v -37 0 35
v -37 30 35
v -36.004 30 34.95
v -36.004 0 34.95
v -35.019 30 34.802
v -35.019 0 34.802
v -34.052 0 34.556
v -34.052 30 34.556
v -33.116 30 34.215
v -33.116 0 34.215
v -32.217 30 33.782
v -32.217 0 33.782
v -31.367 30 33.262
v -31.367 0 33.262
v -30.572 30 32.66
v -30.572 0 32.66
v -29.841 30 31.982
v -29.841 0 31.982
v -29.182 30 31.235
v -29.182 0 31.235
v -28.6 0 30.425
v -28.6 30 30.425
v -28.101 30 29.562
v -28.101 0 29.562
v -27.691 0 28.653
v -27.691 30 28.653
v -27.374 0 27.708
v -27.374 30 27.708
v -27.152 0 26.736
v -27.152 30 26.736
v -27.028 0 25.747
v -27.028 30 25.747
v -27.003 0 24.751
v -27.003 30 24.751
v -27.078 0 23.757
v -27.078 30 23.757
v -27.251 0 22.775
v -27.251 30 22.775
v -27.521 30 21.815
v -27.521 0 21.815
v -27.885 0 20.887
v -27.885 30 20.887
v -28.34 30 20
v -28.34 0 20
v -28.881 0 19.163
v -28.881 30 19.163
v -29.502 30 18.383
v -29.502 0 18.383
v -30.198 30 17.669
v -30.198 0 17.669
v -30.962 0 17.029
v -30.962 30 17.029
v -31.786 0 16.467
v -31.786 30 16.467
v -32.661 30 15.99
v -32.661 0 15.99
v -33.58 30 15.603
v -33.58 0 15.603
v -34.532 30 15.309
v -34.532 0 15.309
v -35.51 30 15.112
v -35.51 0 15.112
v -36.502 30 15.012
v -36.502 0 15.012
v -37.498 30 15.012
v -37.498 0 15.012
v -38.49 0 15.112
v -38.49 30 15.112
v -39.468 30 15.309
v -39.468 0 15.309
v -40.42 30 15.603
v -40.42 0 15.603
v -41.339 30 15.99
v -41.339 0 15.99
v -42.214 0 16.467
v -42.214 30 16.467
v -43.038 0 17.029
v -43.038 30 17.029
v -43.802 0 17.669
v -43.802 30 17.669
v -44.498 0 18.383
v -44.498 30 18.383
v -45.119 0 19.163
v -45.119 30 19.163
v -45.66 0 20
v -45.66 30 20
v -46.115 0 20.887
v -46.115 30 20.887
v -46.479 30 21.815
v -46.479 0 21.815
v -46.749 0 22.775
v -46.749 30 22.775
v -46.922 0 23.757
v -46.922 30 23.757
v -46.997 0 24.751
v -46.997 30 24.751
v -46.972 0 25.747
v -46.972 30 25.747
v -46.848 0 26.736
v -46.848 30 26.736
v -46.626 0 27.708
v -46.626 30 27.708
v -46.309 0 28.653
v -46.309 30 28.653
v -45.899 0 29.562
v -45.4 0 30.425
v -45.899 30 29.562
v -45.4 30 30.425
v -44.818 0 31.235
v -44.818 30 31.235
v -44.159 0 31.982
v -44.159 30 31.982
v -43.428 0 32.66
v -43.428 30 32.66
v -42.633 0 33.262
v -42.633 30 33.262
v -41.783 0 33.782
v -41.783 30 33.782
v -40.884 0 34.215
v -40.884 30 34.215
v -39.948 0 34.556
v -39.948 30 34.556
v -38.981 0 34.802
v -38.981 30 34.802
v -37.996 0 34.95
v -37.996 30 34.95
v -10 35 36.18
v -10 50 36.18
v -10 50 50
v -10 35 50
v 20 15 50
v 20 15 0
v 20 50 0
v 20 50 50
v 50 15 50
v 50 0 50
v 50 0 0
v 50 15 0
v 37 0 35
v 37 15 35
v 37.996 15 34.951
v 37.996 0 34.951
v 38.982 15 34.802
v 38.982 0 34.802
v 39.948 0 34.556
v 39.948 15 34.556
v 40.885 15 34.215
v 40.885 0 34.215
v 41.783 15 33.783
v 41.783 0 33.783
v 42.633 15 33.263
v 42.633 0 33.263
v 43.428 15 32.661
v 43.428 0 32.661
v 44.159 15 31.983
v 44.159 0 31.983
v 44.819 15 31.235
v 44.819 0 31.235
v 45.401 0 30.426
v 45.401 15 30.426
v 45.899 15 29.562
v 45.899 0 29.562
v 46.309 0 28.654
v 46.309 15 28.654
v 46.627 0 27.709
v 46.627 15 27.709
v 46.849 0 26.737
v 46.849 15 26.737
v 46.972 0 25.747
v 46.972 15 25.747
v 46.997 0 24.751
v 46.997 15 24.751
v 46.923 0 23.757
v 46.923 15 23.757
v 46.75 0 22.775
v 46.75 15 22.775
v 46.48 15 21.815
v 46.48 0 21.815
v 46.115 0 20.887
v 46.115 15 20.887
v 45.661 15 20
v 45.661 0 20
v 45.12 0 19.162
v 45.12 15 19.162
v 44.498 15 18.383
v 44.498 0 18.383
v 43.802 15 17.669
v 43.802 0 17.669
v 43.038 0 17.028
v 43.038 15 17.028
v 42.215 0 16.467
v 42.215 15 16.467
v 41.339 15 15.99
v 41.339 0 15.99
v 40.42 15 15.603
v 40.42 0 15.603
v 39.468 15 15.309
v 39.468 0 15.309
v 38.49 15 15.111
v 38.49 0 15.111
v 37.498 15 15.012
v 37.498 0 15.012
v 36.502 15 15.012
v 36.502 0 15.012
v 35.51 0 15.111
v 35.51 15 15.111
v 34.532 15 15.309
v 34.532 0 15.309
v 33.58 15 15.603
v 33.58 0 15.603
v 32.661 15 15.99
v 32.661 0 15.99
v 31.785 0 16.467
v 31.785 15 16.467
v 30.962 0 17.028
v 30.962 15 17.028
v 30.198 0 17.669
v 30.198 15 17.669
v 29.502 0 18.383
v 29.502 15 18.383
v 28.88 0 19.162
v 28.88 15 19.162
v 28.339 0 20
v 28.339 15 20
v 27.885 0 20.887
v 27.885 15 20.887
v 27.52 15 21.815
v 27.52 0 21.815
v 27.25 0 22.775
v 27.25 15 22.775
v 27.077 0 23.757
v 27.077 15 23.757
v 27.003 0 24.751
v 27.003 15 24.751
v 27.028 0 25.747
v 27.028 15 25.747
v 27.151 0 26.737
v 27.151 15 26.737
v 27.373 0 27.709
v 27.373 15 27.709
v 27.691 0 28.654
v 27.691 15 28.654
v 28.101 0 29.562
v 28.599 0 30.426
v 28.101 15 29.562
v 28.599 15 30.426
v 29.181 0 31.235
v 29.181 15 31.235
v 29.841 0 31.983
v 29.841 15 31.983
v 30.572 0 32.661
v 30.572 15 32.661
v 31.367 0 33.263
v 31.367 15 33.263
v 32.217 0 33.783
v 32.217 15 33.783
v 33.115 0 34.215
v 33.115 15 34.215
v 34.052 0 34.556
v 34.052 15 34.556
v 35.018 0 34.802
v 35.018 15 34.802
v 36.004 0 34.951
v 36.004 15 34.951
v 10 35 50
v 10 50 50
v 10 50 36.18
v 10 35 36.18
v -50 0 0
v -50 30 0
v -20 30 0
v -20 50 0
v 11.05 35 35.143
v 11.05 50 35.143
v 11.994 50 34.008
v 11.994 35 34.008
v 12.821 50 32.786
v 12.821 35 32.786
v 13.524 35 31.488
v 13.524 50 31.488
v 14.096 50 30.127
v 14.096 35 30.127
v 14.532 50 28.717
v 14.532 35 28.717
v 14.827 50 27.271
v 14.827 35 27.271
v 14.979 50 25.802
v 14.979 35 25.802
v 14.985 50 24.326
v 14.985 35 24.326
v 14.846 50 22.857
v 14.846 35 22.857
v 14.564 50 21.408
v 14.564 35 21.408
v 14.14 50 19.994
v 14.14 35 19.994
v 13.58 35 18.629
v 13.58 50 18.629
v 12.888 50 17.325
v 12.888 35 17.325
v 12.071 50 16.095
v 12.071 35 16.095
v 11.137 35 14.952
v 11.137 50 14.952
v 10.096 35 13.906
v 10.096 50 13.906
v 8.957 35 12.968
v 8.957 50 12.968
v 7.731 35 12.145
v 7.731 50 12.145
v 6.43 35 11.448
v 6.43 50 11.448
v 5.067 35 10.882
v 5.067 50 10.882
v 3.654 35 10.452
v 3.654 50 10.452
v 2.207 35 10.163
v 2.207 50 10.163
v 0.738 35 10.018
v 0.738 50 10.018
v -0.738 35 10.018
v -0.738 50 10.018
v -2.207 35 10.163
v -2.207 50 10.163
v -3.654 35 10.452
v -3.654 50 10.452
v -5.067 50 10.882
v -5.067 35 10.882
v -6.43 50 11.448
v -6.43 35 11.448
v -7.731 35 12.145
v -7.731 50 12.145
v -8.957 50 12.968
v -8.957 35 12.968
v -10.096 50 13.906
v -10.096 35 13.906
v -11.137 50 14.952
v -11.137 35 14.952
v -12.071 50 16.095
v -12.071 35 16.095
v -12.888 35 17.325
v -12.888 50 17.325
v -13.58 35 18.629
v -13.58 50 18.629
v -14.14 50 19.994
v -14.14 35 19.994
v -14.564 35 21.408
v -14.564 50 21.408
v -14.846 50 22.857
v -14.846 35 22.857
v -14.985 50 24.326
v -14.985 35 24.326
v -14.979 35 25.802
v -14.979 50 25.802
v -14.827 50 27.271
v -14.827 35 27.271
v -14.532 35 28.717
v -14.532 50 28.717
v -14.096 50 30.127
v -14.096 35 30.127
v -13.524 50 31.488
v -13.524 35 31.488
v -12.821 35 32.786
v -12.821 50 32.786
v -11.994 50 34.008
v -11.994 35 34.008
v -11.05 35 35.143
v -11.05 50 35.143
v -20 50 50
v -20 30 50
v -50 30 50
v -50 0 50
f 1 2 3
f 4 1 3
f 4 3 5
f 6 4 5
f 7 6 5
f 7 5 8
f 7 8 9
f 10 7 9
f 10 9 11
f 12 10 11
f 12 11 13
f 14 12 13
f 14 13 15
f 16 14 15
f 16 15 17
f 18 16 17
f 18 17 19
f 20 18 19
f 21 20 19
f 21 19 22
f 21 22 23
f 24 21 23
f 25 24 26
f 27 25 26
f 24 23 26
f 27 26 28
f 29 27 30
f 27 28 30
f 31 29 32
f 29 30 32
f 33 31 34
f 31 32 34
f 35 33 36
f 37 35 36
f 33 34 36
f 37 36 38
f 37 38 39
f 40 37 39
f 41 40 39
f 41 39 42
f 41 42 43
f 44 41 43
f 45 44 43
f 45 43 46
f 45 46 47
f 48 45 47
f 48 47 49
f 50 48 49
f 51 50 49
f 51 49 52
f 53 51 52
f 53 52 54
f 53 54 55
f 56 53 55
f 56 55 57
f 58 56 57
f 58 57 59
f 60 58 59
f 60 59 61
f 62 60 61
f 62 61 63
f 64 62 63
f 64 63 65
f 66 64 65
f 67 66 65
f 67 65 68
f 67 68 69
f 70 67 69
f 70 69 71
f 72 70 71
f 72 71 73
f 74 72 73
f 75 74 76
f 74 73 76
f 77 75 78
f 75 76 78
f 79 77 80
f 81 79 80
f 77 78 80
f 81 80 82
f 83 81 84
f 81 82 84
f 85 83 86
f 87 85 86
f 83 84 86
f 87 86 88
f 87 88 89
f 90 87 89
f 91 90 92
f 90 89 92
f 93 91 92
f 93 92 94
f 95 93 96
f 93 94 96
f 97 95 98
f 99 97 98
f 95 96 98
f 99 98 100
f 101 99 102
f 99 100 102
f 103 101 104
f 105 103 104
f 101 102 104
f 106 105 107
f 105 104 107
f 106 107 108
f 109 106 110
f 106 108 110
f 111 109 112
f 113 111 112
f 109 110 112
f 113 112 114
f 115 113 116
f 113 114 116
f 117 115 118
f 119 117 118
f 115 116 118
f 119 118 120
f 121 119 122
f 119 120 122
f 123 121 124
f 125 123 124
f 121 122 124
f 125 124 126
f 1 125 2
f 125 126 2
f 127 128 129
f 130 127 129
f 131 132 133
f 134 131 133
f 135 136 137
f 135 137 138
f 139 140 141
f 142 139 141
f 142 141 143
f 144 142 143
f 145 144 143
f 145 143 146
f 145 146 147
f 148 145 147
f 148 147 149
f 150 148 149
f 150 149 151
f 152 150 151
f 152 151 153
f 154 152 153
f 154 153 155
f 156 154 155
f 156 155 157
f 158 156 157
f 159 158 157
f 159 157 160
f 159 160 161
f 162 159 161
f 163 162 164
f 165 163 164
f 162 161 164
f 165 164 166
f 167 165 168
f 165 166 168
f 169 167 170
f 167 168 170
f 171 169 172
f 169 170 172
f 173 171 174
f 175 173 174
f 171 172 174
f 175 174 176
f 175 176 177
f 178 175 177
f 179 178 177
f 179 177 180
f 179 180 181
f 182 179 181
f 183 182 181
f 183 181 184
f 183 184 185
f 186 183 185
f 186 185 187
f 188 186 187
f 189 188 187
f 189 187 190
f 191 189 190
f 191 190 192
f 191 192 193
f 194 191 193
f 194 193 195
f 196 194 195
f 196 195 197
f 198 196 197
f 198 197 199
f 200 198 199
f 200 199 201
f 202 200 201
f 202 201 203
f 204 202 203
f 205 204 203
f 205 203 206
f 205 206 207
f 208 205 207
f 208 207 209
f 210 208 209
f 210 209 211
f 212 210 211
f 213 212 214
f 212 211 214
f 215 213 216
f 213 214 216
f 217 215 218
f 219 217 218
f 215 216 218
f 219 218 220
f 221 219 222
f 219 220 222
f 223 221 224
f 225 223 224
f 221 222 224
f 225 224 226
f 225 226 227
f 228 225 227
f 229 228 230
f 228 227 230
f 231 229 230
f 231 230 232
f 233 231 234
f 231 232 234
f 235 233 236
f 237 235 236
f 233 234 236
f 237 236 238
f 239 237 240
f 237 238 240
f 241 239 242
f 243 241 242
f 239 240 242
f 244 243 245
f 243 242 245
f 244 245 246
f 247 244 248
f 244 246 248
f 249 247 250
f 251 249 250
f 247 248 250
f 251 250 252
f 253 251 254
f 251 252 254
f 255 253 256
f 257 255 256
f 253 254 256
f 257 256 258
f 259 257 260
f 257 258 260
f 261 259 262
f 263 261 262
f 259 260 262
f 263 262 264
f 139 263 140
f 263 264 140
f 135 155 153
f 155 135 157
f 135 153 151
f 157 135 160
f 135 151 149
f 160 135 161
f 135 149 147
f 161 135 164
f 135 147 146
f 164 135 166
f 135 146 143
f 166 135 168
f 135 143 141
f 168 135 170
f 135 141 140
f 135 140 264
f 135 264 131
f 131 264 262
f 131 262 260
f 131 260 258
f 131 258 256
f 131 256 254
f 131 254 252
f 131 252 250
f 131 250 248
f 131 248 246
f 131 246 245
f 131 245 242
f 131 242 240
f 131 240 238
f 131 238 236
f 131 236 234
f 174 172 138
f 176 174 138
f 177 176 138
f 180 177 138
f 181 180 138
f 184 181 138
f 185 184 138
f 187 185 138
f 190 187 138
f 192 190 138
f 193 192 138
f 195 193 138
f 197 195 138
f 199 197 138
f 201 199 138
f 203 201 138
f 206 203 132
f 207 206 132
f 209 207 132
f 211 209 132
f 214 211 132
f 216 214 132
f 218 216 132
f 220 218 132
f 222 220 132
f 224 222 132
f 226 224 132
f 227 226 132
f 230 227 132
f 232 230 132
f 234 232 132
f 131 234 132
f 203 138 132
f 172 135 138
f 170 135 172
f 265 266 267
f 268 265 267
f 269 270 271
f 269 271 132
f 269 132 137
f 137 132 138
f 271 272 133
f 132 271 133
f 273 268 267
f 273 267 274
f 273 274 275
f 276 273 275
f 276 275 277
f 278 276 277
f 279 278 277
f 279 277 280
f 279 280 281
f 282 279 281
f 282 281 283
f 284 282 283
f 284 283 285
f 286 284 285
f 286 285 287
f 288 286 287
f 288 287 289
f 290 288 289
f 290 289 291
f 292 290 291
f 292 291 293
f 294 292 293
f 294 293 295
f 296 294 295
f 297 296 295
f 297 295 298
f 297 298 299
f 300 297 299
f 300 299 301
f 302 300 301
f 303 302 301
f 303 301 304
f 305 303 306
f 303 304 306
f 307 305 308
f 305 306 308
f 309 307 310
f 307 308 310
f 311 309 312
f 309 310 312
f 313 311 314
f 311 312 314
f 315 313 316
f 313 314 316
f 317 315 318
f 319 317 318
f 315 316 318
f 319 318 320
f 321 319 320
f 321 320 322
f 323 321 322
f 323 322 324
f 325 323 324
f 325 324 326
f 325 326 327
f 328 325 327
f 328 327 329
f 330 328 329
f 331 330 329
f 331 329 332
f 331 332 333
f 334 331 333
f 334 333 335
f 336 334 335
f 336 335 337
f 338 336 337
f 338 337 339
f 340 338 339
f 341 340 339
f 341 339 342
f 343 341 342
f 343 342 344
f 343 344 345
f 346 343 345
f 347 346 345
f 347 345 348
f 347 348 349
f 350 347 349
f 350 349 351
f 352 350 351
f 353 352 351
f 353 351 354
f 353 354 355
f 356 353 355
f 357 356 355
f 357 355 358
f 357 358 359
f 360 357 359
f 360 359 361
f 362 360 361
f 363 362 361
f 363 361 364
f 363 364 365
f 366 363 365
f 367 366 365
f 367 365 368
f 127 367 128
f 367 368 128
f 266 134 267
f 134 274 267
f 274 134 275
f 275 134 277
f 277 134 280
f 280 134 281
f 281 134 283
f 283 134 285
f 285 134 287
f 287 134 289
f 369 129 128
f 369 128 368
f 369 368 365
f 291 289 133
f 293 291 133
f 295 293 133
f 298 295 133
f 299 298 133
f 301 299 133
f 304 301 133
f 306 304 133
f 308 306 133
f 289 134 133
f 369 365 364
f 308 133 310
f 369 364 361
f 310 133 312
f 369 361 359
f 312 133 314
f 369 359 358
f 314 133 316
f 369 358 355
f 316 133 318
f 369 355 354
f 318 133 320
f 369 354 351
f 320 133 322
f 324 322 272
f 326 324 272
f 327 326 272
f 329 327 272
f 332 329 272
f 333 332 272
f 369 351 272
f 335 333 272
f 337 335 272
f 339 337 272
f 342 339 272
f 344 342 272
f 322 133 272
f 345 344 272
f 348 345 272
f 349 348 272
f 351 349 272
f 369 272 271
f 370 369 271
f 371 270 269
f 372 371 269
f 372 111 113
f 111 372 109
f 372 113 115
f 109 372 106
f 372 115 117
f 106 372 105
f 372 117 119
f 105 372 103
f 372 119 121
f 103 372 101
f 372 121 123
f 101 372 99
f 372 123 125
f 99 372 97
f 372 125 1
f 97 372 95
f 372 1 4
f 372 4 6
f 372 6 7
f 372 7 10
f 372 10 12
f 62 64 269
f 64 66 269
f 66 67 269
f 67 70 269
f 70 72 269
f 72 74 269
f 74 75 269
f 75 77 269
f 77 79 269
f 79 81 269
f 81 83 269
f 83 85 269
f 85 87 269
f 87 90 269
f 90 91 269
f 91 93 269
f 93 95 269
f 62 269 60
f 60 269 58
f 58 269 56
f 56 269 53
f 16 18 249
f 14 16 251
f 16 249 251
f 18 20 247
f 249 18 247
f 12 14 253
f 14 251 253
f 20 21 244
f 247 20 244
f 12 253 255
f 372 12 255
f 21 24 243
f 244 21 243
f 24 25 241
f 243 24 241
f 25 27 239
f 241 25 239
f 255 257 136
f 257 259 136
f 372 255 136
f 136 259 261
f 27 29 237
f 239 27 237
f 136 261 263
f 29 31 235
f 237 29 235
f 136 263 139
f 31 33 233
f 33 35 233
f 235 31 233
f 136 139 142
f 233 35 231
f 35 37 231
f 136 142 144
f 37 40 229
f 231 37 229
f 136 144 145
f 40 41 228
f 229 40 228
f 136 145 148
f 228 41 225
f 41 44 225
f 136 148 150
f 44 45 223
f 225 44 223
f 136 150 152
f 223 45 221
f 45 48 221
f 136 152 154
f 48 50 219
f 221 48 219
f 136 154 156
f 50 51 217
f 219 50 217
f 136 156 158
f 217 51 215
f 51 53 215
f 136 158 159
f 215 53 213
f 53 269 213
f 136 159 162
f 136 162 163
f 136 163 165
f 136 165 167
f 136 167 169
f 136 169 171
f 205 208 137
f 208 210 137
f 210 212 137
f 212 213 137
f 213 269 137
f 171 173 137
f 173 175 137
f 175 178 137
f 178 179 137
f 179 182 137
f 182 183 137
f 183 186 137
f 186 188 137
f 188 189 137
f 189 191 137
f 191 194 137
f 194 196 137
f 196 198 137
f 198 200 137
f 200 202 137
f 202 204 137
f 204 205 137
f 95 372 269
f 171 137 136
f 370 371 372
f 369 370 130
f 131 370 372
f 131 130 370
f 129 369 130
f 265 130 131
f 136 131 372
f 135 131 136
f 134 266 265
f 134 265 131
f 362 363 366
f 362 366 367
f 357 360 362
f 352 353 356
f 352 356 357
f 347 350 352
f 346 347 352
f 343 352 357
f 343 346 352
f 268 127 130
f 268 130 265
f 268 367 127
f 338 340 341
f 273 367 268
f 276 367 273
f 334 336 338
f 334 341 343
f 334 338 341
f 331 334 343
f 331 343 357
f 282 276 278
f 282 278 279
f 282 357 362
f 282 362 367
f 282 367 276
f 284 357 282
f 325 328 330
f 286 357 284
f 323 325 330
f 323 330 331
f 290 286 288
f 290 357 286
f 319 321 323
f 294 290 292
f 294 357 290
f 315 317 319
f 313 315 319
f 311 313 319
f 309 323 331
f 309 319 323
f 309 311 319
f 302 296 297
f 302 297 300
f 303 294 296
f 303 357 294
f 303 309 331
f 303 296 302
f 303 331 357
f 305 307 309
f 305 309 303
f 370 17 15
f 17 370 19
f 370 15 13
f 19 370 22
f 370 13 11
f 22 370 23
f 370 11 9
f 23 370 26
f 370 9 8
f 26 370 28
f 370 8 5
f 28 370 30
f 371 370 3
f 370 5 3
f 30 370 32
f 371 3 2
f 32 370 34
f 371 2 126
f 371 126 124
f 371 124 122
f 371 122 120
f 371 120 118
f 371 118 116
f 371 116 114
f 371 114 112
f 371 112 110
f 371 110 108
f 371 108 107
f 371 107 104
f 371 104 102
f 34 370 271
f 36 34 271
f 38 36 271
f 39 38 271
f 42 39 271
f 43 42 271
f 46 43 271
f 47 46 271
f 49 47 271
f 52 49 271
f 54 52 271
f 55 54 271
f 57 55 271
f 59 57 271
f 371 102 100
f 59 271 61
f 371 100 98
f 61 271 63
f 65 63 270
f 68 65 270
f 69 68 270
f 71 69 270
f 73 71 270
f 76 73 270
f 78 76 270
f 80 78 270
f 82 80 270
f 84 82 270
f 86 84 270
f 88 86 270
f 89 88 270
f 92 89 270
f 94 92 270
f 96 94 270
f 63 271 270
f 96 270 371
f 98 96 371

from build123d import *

# Parameters (mm, degrees)
RESSALTO_EXTRUS_O1_DEPTH = 50
ESBO_O2_R                = 10
ESBO_O2_R_2              = 10.000432036
CORTE_EXTRUS_O1_DEPTH    = 87.602540378
ESBO_O3_R                = 15
CORTE_EXTRUS_O2_DEPTH    = 15
CORTE_EXTRUS_O3_DEPTH    = 15


with BuildPart() as part:
    # Esboço1 → Ressalto-extrusão1 (new body)
    with BuildSketch(Plane.XY):
        Polygon((-50, 0), (50, 0), (50, 15), (20, 15), (20, 50), (-20, 50), (-20, 30), (-50, 30), align=None)
    extrude(amount=RESSALTO_EXTRUS_O1_DEPTH)

    # Esboço2 → Corte-extrusão1 (cut, through all)
    with BuildSketch(Plane(origin=(0, 50, 0), x_dir=(1, 0, 0), z_dir=(0, 1, 0))):
        with Locations(Location((-37, -25, 0), (0, 0, 270))):
            Circle(ESBO_O2_R)
        with Locations(Location((37, -25, 0), (0, 0, 270))):
            Circle(ESBO_O2_R_2)
    extrude(amount=-CORTE_EXTRUS_O1_DEPTH, mode=Mode.SUBTRACT)

    # Esboço3 → Corte-extrusão2 (cut)
    with BuildSketch(Plane(origin=(0, 50, 0), x_dir=(1, 0, 0), z_dir=(0, 1, 0))):
        with Locations(Location((0, -25, 0), (0, 0, 270))):
            Circle(ESBO_O3_R)
    extrude(amount=-CORTE_EXTRUS_O2_DEPTH, mode=Mode.SUBTRACT)

    # Esboço5 → Corte-extrusão3 (cut)
    with BuildSketch(Plane(origin=(0, 50, 0), x_dir=(1, 0, 0), z_dir=(0, 1, 0))):
        with BuildLine():
            Line((-10, -36.180339887), (-10, -50))
            Line((-10, -50), (10, -50))
            Line((10, -50), (10, -36.180339887))
            ThreePointArc((10, -36.180339887), (0, -40), (-10, -36.180339887))
        make_face()
    extrude(amount=-CORTE_EXTRUS_O3_DEPTH, mode=Mode.SUBTRACT)


solid = part.part
